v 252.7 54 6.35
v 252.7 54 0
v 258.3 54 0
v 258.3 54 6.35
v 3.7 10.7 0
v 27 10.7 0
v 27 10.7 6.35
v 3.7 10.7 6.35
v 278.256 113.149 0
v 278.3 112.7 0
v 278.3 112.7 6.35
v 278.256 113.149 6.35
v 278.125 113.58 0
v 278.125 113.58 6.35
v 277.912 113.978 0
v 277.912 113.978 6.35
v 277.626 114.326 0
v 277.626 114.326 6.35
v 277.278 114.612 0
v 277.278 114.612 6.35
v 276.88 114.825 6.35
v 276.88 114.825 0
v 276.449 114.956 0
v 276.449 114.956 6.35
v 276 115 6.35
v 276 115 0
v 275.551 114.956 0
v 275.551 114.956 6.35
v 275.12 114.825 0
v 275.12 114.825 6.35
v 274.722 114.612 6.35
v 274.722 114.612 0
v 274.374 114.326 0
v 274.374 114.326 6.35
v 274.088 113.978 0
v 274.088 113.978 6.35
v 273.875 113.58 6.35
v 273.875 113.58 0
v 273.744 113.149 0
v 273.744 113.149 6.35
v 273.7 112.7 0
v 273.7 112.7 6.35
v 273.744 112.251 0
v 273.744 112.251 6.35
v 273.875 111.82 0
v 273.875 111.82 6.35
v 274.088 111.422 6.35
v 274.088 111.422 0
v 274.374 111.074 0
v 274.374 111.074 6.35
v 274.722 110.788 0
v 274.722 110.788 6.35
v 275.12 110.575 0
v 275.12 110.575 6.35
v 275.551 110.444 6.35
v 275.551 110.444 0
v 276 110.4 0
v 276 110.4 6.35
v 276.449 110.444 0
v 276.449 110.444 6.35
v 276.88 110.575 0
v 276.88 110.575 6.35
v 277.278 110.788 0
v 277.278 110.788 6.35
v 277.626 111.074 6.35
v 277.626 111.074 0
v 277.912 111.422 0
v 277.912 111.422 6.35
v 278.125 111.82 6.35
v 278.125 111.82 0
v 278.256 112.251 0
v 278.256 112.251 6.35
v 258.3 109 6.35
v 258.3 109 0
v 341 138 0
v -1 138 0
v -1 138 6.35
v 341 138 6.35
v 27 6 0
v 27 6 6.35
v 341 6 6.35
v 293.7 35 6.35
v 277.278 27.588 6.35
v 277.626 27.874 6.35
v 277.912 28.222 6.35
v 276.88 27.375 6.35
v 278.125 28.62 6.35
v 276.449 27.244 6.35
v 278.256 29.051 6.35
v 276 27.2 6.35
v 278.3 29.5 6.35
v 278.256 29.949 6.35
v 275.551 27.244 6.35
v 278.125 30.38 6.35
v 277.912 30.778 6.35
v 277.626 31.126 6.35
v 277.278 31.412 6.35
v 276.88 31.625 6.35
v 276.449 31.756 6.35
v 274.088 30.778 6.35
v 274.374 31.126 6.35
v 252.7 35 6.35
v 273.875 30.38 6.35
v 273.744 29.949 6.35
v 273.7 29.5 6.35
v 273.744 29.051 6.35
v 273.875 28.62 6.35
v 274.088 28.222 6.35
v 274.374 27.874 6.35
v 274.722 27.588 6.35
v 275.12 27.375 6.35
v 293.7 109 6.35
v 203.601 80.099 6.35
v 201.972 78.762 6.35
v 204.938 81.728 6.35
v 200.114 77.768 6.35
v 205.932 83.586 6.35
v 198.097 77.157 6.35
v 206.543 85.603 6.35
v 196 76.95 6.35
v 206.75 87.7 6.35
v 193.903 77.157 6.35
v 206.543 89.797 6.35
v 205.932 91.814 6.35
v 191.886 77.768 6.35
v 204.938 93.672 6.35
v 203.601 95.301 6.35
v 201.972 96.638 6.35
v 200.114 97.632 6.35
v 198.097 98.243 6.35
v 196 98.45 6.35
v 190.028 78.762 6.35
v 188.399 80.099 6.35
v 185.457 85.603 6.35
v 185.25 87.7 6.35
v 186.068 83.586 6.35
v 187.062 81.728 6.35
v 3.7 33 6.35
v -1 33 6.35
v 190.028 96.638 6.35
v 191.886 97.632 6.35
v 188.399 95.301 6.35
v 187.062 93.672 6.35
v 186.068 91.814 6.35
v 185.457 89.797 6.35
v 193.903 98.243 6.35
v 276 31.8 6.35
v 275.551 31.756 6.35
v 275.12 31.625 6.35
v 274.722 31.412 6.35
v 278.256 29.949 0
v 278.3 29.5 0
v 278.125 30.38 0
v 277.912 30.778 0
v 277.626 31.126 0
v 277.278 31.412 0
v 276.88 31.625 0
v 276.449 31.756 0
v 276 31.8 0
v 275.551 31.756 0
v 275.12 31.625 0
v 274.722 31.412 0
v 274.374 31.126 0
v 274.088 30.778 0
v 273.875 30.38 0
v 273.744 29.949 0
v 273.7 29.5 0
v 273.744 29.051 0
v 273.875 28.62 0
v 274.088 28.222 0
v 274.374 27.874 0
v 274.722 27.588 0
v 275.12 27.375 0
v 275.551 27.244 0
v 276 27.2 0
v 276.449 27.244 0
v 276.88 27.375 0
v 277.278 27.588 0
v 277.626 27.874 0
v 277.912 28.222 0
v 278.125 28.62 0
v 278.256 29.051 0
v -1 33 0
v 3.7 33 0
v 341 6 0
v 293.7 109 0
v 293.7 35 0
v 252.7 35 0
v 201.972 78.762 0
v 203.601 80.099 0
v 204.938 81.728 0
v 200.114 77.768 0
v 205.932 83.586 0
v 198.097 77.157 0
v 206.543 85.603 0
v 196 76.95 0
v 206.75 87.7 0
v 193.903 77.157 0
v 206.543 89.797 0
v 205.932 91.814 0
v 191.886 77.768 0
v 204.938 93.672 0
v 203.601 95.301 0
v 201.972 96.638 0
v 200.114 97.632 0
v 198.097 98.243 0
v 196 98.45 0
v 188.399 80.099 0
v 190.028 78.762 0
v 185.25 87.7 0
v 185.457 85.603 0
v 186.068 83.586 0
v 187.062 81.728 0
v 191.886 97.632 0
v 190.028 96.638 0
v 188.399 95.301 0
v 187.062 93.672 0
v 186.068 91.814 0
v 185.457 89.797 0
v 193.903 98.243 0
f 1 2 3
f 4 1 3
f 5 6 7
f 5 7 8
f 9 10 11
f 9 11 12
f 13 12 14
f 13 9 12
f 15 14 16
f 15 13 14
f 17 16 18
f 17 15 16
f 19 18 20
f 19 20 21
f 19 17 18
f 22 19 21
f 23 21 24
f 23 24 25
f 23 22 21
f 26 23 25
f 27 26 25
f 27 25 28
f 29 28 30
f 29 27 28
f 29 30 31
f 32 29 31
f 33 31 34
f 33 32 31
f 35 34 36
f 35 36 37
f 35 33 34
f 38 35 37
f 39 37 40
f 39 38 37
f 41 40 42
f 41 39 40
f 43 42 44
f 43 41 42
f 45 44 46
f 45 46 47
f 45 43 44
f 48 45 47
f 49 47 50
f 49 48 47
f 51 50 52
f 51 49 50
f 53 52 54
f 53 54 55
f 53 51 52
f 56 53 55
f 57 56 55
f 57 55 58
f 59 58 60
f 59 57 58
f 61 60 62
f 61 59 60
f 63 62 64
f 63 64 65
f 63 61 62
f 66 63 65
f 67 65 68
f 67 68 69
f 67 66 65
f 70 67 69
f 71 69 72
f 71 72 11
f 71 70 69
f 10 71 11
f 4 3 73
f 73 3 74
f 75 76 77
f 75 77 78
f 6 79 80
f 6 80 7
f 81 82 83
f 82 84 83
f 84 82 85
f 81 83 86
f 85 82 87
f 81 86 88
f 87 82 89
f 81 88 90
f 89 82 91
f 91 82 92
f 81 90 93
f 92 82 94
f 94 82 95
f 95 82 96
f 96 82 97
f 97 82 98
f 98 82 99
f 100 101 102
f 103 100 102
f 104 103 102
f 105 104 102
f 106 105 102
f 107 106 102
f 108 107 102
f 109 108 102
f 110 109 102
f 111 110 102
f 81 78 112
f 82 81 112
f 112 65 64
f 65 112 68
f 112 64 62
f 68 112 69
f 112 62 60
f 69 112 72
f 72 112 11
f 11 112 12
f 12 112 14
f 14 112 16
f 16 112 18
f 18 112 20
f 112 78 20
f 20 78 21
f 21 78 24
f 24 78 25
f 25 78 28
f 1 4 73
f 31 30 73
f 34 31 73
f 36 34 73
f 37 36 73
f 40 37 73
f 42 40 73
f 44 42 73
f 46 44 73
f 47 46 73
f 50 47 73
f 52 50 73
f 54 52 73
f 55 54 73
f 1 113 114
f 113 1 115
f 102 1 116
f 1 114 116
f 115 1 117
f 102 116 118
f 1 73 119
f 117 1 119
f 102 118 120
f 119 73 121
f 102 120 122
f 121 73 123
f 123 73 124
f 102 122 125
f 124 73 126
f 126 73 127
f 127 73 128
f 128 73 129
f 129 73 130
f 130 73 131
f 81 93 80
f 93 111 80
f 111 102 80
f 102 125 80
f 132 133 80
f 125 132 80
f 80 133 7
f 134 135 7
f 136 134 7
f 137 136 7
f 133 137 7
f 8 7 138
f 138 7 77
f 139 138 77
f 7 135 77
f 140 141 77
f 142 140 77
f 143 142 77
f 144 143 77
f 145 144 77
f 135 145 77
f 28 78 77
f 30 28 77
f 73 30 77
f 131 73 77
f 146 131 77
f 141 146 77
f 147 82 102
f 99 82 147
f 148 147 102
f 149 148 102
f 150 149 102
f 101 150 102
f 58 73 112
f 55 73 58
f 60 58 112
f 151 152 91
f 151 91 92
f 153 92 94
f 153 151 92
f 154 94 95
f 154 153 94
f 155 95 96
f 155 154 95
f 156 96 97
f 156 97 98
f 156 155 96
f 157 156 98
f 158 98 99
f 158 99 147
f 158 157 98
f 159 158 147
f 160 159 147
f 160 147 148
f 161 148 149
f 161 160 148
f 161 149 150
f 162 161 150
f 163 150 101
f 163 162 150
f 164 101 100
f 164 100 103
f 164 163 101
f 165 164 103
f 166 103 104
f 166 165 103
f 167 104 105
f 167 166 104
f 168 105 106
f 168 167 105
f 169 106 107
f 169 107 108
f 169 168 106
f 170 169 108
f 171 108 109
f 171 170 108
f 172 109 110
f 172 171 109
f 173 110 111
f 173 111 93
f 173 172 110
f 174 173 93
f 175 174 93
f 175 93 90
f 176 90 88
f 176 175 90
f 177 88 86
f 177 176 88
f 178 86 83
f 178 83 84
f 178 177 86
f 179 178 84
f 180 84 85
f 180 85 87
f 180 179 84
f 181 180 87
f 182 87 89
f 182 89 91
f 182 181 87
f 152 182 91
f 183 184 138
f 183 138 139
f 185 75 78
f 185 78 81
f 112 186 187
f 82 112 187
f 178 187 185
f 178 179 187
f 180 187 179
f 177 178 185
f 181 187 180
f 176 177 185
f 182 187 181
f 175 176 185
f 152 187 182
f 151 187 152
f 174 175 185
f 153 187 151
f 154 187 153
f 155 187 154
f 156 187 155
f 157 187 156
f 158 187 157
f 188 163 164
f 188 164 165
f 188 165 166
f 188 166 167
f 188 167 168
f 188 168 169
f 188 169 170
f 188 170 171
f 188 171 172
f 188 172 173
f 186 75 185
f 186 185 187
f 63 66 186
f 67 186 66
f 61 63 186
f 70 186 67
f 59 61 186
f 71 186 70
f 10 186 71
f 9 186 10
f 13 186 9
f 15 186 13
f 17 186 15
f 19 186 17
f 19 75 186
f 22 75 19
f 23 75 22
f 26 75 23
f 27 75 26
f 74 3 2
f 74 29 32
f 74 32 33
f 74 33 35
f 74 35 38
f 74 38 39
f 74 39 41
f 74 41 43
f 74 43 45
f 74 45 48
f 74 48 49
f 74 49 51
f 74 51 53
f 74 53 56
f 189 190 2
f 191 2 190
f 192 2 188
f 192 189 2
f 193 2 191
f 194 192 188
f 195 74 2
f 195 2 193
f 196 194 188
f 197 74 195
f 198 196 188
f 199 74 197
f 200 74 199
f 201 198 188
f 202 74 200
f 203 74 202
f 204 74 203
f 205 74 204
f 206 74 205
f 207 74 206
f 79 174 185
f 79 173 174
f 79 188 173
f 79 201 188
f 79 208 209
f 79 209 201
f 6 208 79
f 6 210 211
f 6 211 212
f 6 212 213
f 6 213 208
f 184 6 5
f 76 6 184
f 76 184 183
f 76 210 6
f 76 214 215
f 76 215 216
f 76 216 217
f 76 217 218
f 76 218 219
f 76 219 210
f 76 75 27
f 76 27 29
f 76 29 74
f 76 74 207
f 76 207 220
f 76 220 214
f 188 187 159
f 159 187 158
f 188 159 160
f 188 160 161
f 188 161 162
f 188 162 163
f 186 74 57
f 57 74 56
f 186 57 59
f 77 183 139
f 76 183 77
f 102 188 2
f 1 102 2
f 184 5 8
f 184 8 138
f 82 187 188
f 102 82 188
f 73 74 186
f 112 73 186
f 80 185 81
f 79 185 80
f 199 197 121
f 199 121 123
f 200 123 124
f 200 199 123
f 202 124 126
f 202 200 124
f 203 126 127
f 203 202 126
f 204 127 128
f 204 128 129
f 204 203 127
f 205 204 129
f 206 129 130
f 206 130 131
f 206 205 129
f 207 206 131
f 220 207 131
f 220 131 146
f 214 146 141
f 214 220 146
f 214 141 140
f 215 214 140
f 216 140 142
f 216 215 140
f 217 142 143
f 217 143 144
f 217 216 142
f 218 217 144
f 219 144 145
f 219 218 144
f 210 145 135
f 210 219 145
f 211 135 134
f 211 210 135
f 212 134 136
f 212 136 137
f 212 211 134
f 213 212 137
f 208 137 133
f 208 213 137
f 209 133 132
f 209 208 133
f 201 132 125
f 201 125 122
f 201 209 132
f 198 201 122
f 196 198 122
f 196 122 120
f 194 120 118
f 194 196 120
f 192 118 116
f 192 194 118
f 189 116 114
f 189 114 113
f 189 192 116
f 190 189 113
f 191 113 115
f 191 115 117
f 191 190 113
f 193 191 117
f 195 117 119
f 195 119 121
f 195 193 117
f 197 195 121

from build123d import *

# Parameters (mm, degrees)
SKETCH1_R           = 2.3
SKETCH1_R_2         = 10.75
BOSS_EXTRUDE1_DEPTH = 6.35


with BuildPart() as part:
    # Sketch1 → Boss-Extrude1 (new body)
    with BuildSketch(Plane.XY):
        Polygon((-1, 138), (341, 138), (341, 6), (27, 6), (27, 10.7), (3.7, 10.7), (3.7, 33), (-1, 33), align=None)
        with Locations((276, 112.7)):
            Circle(SKETCH1_R, mode=Mode.SUBTRACT)
        with Locations((276, 29.5)):
            Circle(SKETCH1_R, mode=Mode.SUBTRACT)
        with Locations((196, 87.7)):
            Circle(SKETCH1_R_2, mode=Mode.SUBTRACT)
        Polygon((293.7, 35), (252.7, 35), (252.7, 54), (258.3, 54), (258.3, 109), (293.7, 109), align=None, mode=Mode.SUBTRACT)
    extrude(amount=BOSS_EXTRUDE1_DEPTH)


solid = part.part
